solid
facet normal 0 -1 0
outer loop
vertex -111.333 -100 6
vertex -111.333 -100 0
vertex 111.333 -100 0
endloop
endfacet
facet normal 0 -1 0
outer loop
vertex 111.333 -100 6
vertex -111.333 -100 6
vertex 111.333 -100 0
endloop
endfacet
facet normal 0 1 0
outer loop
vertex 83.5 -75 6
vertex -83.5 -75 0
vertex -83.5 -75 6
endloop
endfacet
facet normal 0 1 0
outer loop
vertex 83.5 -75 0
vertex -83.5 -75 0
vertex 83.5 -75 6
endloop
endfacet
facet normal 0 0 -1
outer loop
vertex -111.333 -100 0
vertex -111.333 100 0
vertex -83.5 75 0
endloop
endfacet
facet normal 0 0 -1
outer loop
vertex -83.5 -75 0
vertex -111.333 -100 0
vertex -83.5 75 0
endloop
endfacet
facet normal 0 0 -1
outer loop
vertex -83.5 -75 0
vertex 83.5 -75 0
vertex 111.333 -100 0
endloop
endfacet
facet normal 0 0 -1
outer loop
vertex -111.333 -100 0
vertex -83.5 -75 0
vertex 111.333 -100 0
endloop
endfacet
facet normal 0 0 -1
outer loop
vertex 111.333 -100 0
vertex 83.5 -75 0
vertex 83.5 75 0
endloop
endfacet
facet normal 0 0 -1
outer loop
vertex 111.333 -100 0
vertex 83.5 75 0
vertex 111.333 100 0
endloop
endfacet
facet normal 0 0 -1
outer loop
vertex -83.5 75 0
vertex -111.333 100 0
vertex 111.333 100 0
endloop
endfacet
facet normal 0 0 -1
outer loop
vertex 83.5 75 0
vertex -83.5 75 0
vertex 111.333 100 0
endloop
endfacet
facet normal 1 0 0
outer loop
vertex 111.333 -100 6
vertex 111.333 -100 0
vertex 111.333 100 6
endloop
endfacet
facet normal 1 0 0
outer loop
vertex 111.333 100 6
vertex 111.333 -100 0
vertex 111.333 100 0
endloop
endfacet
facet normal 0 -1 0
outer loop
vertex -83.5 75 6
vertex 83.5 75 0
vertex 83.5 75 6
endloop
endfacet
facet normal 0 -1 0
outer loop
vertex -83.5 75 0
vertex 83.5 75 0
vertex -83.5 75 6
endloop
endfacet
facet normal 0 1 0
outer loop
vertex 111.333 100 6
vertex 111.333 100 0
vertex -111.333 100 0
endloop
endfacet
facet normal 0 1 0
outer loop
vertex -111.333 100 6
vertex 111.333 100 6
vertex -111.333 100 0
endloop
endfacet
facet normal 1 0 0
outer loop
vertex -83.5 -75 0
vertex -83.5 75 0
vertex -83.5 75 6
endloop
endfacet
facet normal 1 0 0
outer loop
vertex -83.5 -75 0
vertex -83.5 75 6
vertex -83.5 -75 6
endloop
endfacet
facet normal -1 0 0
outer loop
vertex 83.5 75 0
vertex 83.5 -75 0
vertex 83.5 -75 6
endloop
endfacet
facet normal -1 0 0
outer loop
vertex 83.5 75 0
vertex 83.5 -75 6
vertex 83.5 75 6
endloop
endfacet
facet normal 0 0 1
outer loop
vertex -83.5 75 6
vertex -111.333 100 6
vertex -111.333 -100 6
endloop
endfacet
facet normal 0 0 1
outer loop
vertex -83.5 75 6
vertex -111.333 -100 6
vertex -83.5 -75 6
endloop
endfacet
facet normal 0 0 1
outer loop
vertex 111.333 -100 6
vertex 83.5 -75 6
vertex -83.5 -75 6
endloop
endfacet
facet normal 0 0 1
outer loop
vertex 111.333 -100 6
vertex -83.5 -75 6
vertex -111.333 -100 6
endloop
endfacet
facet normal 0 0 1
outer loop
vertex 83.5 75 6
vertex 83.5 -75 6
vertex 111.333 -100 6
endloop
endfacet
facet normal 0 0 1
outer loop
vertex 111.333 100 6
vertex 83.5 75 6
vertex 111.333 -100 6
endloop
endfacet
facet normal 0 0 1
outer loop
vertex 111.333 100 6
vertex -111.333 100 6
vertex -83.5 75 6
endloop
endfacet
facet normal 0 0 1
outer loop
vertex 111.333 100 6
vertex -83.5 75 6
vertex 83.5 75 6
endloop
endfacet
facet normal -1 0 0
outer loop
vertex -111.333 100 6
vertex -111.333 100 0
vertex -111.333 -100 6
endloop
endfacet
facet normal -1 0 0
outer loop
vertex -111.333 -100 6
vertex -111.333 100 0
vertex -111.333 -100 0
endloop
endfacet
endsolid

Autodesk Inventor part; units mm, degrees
ref_plane "YZ Plane" through (0, 0, 0) normal (1, 0, 0) x (0, 1, 0)
ref_plane "XZ Plane" through (0, 0, 0) normal (0, 1, 0) x (-1, 0, 0)
ref_plane "XY Plane" through (0, 0, 0) normal (0, 0, 1) x (1, 0, 0)
sketch "Sketch1" plane through (0, 0, 0) normal (0, 0, 1) x (1, 0, 0)
  line L0 (-83.5, -75) -> (83.5, -75)
  line L1 (83.5, -75) -> (83.5, 75)
  line L2 (83.5, 75) -> (-83.5, 75)
  line L3 (-83.5, 75) -> (-83.5, -75)
  line L4 (-83.5, -75) -> (83.5, 75) construction
  line L5 (83.5, -75) -> (-83.5, 75) construction
  line L6 (-111.3333, -100) -> (111.3333, -100)
  line L7 (111.3333, -100) -> (111.3333, 100)
  line L8 (111.3333, 100) -> (-111.3333, 100)
  line L9 (-111.3333, 100) -> (-111.3333, -100)
  line L10 (-111.3333, -100) -> (111.3333, 100) construction
  line L11 (111.3333, -100) -> (-111.3333, 100) construction
  point P0 (0, 0)
  dimension "d0" = 167
  dimension "d1" = 150
  dimension "d2" = 200
extrude "Extrusion1" add sketch "Sketch1" along normal blind 6
sketch "Sketch2" plane through (0, 0, 6) normal (0, 0, 1) x (1, 0, 0)
  line L0 (-97.7815, 91.4101) -> (-75.2386, 91.4101) construction
  line L1 (-75.2386, 91.4101) -> (-75.2386, 85.3601) construction
  line L2 (-75.2386, 85.3601) -> (-97.7815, 85.3601) construction
  line L3 (-97.7815, 85.3601) -> (-97.7815, 91.4101) construction
  line L4 (111.3333, -100) -> (111.3333, 100) projected
  line L5 (111.3333, 100) -> (-111.3333, 100) projected
  line L6 (-111.3333, 100) -> (-111.3333, -100) projected
  line L7 (-111.3333, -100) -> (111.3333, -100) projected
  line L8 (-83.5, -75) -> (-83.5, 75) projected
  line L9 (-83.5, 75) -> (83.5, 75) projected
  line L10 (83.5, 75) -> (83.5, -75) projected
  line L11 (83.5, -75) -> (-83.5, -75) projected
  point P0 (0, 0)
properties part number "EngravingJigBottom"
